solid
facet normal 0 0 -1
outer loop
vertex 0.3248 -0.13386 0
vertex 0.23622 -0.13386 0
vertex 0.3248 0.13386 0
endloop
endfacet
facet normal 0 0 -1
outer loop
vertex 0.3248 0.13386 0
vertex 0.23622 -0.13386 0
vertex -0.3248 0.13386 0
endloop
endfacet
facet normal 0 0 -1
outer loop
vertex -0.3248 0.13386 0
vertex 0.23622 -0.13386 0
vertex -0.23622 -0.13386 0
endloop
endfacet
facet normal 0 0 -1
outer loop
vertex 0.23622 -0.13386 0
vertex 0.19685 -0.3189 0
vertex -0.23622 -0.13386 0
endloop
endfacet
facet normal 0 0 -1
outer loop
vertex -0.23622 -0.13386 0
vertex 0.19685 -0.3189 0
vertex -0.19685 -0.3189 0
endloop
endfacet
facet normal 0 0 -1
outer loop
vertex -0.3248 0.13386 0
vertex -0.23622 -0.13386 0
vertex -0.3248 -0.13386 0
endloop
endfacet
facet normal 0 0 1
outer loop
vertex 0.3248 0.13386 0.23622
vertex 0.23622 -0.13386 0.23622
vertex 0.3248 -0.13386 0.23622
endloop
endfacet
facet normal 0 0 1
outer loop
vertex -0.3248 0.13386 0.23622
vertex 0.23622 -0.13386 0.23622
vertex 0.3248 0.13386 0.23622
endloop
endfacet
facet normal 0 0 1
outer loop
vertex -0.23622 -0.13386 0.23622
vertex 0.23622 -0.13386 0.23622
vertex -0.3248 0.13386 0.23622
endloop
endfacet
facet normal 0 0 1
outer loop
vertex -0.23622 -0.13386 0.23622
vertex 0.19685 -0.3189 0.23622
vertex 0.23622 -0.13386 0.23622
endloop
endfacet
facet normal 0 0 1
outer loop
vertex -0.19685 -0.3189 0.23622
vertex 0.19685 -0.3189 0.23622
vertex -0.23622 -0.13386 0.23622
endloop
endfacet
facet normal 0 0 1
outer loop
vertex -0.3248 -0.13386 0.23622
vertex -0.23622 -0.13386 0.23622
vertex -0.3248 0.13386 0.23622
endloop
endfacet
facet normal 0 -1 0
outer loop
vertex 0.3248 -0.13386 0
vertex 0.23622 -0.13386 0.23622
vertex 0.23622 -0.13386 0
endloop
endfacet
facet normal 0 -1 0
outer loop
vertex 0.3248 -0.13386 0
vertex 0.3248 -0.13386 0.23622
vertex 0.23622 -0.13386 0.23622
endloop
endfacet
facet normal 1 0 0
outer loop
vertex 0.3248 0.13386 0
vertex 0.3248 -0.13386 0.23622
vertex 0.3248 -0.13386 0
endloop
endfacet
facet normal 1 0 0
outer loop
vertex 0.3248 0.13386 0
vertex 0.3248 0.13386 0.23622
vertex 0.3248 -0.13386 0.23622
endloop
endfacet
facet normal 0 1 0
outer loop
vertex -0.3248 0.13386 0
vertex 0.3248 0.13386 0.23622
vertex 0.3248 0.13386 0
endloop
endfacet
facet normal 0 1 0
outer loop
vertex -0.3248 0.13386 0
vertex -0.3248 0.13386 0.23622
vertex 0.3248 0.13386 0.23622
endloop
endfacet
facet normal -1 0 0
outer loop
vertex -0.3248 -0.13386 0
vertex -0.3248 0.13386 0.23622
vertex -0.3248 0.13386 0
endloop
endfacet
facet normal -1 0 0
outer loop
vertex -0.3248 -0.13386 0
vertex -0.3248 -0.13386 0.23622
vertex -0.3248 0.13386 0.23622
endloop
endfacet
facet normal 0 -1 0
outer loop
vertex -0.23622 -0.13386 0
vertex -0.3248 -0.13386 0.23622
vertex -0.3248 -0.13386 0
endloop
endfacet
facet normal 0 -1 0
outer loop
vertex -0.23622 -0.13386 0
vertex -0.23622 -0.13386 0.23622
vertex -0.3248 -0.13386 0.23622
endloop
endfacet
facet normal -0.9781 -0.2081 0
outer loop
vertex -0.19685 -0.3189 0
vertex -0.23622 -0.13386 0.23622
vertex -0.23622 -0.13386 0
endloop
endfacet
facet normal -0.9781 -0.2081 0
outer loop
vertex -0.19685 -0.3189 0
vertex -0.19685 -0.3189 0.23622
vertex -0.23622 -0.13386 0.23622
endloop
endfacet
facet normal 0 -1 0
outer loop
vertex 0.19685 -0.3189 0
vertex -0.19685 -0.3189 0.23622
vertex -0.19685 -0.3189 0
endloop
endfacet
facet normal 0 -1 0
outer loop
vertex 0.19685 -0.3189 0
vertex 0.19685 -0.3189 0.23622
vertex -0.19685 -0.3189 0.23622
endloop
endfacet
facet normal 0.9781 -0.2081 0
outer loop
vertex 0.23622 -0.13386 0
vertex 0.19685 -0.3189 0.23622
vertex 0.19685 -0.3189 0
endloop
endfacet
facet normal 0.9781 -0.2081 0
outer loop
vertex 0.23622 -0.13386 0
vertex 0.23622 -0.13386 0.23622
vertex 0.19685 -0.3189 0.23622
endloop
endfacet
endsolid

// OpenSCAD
// file: defines.scad
Wb = 1.65;
Hb = 0.68;
H =  1.15;
Wf = 1.20;
Fo = 0.10;

scale = 1/2.54;
// main file
include <defines.scad>


scale(scale) color([0.8, 0.8, 0.8]) {

  linear_extrude(height = 0.60, center = false)
    polygon([
      [-Wb/2,  Hb/2],
      [ Wb/2,  Hb/2],
      [ Wb/2, -Hb/2],
      [ Wf/2, -Hb/2],
      [ Wf/2-Fo, Hb/2-H],
      [-Wf/2+Fo, Hb/2-H],
      [-Wf/2, -Hb/2],
      [-Wb/2, -Hb/2]
    ]);


  /*translate([-1.65/2, -0.68/2, 0]) cube([1.65, 0.68, 0.60], center=false);
  translate([-1.20/2, -1.15+0.68/2, 0]) cube([1.20, 1.15, 0.60], center=false);*/

}
